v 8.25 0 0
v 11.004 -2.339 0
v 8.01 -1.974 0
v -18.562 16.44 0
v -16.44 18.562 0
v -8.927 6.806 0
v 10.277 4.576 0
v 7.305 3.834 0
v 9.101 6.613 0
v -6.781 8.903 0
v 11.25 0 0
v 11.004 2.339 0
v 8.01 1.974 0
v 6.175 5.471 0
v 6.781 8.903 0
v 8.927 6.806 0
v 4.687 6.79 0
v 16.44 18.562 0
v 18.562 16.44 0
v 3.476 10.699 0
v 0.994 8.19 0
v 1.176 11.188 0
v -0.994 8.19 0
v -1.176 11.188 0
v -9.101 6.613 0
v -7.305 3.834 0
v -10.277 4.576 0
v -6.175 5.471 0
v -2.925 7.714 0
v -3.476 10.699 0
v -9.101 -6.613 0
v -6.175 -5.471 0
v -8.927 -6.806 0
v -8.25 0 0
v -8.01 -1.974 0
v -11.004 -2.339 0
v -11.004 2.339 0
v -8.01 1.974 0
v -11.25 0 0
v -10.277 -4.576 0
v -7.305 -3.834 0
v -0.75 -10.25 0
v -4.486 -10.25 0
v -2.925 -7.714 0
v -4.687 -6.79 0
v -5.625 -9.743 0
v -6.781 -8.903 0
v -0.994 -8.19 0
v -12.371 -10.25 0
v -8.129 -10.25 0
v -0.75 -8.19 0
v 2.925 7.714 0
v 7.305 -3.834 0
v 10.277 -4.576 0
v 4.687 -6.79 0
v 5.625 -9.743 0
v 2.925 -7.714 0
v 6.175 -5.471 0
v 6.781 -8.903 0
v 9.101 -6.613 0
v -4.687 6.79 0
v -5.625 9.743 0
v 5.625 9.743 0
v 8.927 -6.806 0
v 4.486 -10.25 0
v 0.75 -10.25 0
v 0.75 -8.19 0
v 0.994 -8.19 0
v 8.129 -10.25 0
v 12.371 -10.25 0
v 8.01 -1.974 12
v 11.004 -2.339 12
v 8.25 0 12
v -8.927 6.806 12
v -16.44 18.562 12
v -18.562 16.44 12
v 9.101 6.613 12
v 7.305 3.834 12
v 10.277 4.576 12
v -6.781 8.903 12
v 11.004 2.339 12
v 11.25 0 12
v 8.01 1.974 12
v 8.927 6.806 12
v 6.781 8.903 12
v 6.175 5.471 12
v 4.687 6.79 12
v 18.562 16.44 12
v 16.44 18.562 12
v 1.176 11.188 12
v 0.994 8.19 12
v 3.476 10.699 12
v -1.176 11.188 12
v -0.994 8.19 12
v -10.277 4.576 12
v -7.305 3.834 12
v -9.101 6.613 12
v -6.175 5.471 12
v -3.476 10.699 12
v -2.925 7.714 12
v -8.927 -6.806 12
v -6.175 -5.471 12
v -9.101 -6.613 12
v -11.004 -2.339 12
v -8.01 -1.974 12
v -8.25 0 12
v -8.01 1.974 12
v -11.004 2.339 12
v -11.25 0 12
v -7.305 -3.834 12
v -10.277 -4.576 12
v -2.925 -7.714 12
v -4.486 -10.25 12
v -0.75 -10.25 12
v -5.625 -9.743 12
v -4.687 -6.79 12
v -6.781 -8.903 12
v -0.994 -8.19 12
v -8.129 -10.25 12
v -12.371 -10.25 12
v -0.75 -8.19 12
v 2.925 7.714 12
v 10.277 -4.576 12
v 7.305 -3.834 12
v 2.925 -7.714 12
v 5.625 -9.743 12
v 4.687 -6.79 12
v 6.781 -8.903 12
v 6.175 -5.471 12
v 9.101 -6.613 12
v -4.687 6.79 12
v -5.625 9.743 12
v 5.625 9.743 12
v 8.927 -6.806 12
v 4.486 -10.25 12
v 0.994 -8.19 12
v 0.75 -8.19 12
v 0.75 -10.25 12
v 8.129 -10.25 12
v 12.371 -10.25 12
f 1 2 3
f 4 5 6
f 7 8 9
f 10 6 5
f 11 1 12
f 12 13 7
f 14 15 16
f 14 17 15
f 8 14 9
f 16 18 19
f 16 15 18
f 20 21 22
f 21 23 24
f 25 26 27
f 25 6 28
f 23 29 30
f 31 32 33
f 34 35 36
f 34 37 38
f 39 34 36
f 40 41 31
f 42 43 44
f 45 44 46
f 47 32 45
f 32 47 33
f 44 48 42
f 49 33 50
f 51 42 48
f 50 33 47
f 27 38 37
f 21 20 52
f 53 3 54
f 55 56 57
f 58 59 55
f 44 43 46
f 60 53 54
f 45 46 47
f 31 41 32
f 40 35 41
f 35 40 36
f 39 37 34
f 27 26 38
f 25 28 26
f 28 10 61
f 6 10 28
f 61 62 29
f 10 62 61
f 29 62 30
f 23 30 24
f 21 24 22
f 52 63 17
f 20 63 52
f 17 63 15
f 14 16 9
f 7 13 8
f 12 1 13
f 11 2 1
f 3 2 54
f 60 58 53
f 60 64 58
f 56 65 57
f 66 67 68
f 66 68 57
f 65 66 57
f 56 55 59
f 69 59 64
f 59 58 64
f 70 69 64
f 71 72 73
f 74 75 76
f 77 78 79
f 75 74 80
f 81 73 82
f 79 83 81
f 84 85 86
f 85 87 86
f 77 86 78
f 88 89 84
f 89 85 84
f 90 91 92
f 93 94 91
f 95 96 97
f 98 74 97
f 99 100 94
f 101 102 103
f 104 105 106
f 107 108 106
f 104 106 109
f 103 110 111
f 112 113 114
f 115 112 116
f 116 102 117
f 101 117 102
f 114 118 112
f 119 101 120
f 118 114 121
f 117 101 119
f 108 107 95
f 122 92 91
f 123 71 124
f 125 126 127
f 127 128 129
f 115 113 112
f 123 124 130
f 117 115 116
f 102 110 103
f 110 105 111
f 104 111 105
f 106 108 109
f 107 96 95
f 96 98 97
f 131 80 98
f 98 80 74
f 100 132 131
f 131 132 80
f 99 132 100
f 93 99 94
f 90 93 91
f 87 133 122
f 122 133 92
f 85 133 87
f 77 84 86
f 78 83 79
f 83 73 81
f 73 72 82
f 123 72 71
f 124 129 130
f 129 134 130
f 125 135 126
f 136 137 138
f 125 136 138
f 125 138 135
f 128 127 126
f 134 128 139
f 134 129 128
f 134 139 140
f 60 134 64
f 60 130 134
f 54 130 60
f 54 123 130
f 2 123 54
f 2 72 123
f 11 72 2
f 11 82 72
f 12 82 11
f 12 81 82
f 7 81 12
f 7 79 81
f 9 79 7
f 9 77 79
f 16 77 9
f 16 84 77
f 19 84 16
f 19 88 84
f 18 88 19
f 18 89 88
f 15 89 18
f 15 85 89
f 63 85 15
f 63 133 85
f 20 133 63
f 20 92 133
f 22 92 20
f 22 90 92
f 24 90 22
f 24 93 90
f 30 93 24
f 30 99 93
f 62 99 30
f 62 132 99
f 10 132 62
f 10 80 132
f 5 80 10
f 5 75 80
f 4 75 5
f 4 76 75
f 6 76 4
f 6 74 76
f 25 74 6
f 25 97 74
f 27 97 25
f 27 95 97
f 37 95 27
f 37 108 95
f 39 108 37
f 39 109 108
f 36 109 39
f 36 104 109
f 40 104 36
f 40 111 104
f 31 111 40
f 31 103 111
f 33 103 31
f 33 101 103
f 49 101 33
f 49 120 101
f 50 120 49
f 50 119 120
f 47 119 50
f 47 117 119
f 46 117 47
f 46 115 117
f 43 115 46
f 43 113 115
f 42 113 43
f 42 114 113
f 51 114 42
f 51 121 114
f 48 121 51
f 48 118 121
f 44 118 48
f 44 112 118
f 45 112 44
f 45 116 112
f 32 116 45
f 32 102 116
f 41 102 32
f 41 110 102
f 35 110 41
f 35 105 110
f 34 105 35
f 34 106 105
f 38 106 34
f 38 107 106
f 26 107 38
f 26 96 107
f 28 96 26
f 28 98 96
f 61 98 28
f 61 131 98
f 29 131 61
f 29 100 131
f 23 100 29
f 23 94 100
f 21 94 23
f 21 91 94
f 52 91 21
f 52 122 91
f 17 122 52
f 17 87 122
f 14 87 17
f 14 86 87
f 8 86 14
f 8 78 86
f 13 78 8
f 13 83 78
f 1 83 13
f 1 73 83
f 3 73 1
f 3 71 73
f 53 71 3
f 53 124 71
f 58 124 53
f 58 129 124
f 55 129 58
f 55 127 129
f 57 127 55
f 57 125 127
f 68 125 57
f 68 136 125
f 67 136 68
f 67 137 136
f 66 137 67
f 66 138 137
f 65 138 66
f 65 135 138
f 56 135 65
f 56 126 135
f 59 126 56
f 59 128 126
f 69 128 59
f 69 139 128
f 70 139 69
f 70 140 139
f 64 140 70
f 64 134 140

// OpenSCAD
innerRadius = 16.5 / 2;
openWidth = 1.5;
thickness = 3;
width = 12;
spikeLength = 15;
groundClearance = 2;

linear_extrude(width) {
    difference() {
        union() {
            circle(innerRadius + thickness);
            for (rotation = [45:90:315]) {
                rotate([0, 0, rotation])
                translate([innerRadius + spikeLength / 2 + thickness / 2, 0, 0])
                    square([spikeLength, thickness], true);
            }
        }
        circle(innerRadius, $fa = 6);
        translate([0, -innerRadius, 0])
            square([openWidth, thickness + innerRadius], true);
        
        groundRemoverHeight = thickness + spikeLength;
        translate([0, -(innerRadius + groundClearance + groundRemoverHeight / 2), 0])
            square([innerRadius * 2 + thickness * 2 + spikeLength, groundRemoverHeight], true);
    }
}
